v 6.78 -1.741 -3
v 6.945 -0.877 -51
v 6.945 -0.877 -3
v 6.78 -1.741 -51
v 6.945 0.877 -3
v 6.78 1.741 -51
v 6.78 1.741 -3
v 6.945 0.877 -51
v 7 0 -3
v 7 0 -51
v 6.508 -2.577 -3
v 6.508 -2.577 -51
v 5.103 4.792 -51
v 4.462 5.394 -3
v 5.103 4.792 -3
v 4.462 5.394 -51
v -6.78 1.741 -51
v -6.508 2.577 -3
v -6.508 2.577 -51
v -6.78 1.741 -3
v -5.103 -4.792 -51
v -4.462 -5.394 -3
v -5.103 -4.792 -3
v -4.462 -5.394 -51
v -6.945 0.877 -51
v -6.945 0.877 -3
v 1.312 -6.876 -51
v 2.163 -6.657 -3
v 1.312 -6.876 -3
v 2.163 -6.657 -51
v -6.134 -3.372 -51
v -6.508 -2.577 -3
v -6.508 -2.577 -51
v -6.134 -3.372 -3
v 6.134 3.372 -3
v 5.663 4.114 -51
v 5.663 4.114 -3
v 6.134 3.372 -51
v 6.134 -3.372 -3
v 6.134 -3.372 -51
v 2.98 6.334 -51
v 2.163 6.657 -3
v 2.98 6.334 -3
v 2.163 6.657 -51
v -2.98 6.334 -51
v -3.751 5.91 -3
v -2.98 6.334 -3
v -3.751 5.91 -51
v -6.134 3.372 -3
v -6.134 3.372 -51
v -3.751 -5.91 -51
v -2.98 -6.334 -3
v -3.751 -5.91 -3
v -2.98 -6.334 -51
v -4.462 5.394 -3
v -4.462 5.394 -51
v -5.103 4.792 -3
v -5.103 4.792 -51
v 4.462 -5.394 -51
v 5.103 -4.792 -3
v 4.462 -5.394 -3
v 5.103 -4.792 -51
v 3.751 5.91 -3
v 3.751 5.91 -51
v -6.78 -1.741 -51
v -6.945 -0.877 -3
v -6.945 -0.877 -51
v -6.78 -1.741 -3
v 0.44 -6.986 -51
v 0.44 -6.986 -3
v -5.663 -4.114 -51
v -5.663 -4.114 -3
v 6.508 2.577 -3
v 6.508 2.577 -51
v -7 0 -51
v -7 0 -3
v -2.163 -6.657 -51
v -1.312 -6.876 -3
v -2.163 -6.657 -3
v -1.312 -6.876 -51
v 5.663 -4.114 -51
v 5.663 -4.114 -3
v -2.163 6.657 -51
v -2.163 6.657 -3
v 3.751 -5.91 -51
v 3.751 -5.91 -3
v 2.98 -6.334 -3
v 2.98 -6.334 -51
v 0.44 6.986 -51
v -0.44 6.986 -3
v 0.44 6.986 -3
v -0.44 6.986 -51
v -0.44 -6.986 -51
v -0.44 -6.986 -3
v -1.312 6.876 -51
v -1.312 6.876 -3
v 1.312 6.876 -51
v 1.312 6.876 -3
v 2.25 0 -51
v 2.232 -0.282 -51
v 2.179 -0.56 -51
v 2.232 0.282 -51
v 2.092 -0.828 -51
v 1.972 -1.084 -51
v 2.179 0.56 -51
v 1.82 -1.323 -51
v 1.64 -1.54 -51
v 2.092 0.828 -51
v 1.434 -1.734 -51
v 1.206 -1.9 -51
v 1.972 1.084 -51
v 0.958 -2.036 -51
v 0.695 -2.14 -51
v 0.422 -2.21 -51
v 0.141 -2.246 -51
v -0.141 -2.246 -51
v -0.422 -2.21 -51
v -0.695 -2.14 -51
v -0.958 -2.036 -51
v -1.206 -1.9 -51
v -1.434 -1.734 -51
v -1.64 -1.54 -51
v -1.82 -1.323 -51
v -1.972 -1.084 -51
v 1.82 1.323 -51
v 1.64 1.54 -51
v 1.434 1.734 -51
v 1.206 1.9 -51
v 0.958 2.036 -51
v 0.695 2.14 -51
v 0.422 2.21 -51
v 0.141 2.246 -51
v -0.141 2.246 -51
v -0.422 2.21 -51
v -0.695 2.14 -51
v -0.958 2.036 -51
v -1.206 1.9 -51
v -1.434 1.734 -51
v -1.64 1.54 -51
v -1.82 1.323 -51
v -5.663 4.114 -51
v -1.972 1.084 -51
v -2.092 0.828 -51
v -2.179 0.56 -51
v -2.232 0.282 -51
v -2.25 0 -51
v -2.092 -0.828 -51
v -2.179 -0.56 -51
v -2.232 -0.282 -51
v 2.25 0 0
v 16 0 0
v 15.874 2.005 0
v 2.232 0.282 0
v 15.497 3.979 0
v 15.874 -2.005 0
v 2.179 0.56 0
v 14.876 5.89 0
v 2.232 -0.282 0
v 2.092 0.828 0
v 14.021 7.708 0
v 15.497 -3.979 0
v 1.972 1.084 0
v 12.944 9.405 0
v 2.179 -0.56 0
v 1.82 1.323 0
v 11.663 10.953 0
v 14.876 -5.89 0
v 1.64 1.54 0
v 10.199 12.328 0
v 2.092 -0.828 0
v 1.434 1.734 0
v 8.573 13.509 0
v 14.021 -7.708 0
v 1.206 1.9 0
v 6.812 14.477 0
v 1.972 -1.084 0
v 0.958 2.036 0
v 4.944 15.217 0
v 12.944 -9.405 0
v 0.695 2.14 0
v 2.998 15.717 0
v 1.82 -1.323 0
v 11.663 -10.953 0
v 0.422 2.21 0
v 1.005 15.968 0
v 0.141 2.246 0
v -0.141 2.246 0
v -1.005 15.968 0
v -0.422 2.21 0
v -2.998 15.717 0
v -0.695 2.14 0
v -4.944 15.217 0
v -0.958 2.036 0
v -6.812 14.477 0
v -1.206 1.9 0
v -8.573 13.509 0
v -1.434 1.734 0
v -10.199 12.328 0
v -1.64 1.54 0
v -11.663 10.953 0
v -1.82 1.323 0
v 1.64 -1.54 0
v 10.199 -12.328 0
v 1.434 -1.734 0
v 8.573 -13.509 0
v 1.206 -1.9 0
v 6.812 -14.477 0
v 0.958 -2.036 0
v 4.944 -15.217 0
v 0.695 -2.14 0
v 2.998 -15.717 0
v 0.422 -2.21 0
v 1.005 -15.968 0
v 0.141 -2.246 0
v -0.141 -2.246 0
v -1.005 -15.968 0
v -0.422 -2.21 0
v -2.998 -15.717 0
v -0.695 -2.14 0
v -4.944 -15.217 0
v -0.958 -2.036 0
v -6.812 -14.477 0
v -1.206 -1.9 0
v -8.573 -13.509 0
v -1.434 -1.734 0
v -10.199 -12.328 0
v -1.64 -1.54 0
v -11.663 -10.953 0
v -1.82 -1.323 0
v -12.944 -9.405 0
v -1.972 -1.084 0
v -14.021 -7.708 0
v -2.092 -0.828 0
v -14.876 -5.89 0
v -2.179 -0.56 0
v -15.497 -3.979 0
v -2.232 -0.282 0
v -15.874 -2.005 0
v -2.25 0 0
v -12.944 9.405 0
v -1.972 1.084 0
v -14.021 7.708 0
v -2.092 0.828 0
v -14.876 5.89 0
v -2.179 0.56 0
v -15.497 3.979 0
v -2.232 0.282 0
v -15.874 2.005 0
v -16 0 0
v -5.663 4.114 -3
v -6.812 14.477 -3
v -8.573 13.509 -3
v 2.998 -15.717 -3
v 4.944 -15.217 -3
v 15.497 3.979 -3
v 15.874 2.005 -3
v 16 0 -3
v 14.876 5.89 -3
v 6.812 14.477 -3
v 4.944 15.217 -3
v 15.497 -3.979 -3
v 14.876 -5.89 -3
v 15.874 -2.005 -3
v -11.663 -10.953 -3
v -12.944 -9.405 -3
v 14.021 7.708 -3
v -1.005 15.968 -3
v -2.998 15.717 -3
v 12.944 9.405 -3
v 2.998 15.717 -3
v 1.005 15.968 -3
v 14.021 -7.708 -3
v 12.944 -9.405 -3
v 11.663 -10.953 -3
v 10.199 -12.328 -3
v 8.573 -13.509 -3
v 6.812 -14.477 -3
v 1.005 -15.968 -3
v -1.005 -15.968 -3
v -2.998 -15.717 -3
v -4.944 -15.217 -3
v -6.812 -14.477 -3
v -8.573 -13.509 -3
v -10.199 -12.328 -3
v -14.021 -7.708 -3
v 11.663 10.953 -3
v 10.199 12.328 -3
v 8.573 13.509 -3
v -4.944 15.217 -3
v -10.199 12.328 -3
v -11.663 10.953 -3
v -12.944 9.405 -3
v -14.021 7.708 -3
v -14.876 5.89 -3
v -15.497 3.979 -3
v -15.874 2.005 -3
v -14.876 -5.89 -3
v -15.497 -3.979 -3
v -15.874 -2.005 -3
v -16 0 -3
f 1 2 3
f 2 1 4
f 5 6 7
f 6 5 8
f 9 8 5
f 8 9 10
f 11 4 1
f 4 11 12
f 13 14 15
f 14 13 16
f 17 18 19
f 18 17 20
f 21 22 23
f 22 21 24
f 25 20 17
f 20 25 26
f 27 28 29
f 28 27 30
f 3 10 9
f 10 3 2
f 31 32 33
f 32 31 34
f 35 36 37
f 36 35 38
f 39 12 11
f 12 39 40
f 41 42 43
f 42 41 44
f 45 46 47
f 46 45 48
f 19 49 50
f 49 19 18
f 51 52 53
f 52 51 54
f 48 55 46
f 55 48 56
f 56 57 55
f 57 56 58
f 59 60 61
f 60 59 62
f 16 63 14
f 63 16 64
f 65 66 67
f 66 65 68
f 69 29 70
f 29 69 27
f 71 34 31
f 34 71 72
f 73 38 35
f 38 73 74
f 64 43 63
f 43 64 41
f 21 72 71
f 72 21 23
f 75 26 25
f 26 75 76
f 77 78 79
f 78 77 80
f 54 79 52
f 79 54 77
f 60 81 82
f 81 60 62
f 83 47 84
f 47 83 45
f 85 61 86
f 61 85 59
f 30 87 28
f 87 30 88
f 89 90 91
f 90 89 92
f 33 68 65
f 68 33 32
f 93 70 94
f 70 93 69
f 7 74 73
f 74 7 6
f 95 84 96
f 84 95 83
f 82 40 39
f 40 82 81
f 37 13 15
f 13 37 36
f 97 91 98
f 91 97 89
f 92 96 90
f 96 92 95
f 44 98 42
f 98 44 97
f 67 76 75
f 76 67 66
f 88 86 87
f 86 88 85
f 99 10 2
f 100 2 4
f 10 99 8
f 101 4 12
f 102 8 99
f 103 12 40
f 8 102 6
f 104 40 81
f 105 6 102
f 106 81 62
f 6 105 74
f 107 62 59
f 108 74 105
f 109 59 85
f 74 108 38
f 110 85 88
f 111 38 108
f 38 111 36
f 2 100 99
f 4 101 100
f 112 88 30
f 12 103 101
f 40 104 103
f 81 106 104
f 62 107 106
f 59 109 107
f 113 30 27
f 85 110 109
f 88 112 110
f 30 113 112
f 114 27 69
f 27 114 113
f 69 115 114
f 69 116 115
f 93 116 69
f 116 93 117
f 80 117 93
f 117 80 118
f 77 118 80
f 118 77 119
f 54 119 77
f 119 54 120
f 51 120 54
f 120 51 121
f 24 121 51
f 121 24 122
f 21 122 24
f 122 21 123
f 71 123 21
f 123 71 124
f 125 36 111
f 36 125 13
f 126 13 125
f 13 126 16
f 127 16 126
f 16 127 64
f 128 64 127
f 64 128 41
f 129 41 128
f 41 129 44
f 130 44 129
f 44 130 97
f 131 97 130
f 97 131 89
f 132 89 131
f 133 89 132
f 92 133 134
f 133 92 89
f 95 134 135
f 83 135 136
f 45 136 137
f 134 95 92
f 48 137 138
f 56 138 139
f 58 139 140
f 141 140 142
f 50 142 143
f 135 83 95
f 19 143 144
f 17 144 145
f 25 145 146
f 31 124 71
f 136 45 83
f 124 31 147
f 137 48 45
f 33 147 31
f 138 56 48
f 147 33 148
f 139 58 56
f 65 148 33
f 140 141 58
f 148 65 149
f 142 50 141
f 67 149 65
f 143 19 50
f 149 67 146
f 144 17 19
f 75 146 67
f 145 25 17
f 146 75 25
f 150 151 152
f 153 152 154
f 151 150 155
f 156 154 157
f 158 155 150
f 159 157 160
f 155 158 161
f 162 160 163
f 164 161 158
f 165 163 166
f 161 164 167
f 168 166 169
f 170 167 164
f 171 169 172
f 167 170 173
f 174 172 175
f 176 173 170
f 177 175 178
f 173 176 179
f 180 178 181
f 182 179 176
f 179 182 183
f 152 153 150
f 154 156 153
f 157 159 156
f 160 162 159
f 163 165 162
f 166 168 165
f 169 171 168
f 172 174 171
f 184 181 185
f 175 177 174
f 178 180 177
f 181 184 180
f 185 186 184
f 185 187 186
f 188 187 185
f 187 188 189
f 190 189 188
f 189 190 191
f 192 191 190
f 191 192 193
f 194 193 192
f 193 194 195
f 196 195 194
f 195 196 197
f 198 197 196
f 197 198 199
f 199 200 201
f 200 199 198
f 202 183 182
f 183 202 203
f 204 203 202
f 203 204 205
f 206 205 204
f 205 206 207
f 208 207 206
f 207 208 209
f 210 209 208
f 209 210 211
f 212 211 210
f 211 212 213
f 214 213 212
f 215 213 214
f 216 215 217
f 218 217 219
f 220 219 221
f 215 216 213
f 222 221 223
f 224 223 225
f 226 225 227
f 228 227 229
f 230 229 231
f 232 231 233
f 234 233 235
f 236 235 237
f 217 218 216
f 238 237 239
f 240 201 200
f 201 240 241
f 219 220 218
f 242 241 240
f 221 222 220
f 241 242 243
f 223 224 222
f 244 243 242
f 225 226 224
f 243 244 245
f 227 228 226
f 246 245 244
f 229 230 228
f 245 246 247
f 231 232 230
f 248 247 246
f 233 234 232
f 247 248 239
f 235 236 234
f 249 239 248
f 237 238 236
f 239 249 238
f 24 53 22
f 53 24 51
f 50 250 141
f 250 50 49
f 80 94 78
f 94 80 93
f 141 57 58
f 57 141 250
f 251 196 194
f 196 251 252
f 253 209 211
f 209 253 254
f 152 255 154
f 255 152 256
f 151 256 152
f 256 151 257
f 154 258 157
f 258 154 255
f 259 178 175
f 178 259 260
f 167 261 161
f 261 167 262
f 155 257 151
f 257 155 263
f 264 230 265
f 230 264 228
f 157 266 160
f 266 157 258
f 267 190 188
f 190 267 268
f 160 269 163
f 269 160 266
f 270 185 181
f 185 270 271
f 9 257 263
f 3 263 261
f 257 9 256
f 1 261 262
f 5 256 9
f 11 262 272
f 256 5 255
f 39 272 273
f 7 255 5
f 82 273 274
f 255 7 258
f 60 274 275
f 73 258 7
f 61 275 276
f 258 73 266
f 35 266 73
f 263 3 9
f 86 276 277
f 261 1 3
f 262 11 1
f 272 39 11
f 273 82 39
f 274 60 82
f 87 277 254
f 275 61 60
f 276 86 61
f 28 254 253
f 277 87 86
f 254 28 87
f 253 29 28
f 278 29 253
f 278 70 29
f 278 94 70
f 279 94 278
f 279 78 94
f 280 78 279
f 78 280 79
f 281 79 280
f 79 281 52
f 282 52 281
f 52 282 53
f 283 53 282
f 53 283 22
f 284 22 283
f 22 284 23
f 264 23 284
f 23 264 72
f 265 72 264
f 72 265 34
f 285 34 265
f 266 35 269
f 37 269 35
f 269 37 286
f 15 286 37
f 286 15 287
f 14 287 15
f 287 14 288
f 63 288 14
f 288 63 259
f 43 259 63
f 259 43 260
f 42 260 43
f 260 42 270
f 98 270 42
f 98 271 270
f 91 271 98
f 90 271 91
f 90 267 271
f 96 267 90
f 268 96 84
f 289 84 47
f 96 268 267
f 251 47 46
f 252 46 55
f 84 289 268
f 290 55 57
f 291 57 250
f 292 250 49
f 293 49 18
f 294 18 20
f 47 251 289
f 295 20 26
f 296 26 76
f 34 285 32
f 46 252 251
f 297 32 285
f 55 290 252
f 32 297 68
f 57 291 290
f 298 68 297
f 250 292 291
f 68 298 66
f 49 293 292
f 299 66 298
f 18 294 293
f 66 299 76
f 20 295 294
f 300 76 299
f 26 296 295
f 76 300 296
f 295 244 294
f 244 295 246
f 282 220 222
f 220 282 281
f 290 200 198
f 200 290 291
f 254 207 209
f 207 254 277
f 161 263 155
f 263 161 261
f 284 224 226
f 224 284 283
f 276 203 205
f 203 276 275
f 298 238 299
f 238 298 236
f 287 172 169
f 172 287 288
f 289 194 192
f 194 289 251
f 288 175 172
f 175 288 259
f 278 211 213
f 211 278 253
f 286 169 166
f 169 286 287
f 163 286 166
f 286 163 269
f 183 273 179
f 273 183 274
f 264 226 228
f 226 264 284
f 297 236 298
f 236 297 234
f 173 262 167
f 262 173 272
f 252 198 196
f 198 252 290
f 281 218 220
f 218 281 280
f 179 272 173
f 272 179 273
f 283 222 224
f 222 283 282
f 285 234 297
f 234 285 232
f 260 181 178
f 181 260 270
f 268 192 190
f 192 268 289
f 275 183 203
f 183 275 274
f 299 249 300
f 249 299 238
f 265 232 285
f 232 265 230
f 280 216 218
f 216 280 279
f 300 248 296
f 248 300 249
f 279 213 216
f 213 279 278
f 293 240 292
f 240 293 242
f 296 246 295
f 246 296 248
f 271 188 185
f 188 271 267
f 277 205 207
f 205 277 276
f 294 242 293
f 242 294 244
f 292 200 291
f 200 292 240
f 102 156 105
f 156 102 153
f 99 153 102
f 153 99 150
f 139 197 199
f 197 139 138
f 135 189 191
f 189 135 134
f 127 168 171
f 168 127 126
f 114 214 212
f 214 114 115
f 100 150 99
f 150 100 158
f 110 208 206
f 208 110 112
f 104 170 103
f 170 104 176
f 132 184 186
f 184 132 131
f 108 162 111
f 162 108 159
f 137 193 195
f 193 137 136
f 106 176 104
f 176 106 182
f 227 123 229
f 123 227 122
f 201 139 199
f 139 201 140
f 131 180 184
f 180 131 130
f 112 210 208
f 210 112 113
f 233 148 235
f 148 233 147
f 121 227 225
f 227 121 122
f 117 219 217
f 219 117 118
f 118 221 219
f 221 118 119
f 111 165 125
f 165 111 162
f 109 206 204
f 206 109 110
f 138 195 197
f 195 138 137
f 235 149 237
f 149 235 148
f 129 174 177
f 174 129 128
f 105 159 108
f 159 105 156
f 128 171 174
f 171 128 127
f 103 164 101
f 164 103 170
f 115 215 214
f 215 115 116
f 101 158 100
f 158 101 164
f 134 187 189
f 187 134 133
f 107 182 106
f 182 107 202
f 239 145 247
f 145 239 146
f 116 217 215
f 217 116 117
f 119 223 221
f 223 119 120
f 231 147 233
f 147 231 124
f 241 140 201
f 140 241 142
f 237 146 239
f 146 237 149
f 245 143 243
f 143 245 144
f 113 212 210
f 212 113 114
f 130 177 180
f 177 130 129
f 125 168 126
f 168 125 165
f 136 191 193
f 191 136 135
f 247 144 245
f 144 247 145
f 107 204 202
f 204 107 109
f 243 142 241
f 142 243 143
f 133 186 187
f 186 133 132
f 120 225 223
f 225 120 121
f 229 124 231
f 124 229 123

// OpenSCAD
$fn = 50;


difference() {
	union() {
		translate(v = [0, 0, -51.0000000000]) {
			cylinder(h = 51, r = 7.0000000000);
		}
		translate(v = [0, 0, -3.0000000000]) {
			cylinder(h = 3, r = 16.0000000000);
		}
	}
	union() {
		#translate(v = [0, 0, -51]) {
			cylinder(h = 51, r = 2.2500000000);
		}
	}
}
